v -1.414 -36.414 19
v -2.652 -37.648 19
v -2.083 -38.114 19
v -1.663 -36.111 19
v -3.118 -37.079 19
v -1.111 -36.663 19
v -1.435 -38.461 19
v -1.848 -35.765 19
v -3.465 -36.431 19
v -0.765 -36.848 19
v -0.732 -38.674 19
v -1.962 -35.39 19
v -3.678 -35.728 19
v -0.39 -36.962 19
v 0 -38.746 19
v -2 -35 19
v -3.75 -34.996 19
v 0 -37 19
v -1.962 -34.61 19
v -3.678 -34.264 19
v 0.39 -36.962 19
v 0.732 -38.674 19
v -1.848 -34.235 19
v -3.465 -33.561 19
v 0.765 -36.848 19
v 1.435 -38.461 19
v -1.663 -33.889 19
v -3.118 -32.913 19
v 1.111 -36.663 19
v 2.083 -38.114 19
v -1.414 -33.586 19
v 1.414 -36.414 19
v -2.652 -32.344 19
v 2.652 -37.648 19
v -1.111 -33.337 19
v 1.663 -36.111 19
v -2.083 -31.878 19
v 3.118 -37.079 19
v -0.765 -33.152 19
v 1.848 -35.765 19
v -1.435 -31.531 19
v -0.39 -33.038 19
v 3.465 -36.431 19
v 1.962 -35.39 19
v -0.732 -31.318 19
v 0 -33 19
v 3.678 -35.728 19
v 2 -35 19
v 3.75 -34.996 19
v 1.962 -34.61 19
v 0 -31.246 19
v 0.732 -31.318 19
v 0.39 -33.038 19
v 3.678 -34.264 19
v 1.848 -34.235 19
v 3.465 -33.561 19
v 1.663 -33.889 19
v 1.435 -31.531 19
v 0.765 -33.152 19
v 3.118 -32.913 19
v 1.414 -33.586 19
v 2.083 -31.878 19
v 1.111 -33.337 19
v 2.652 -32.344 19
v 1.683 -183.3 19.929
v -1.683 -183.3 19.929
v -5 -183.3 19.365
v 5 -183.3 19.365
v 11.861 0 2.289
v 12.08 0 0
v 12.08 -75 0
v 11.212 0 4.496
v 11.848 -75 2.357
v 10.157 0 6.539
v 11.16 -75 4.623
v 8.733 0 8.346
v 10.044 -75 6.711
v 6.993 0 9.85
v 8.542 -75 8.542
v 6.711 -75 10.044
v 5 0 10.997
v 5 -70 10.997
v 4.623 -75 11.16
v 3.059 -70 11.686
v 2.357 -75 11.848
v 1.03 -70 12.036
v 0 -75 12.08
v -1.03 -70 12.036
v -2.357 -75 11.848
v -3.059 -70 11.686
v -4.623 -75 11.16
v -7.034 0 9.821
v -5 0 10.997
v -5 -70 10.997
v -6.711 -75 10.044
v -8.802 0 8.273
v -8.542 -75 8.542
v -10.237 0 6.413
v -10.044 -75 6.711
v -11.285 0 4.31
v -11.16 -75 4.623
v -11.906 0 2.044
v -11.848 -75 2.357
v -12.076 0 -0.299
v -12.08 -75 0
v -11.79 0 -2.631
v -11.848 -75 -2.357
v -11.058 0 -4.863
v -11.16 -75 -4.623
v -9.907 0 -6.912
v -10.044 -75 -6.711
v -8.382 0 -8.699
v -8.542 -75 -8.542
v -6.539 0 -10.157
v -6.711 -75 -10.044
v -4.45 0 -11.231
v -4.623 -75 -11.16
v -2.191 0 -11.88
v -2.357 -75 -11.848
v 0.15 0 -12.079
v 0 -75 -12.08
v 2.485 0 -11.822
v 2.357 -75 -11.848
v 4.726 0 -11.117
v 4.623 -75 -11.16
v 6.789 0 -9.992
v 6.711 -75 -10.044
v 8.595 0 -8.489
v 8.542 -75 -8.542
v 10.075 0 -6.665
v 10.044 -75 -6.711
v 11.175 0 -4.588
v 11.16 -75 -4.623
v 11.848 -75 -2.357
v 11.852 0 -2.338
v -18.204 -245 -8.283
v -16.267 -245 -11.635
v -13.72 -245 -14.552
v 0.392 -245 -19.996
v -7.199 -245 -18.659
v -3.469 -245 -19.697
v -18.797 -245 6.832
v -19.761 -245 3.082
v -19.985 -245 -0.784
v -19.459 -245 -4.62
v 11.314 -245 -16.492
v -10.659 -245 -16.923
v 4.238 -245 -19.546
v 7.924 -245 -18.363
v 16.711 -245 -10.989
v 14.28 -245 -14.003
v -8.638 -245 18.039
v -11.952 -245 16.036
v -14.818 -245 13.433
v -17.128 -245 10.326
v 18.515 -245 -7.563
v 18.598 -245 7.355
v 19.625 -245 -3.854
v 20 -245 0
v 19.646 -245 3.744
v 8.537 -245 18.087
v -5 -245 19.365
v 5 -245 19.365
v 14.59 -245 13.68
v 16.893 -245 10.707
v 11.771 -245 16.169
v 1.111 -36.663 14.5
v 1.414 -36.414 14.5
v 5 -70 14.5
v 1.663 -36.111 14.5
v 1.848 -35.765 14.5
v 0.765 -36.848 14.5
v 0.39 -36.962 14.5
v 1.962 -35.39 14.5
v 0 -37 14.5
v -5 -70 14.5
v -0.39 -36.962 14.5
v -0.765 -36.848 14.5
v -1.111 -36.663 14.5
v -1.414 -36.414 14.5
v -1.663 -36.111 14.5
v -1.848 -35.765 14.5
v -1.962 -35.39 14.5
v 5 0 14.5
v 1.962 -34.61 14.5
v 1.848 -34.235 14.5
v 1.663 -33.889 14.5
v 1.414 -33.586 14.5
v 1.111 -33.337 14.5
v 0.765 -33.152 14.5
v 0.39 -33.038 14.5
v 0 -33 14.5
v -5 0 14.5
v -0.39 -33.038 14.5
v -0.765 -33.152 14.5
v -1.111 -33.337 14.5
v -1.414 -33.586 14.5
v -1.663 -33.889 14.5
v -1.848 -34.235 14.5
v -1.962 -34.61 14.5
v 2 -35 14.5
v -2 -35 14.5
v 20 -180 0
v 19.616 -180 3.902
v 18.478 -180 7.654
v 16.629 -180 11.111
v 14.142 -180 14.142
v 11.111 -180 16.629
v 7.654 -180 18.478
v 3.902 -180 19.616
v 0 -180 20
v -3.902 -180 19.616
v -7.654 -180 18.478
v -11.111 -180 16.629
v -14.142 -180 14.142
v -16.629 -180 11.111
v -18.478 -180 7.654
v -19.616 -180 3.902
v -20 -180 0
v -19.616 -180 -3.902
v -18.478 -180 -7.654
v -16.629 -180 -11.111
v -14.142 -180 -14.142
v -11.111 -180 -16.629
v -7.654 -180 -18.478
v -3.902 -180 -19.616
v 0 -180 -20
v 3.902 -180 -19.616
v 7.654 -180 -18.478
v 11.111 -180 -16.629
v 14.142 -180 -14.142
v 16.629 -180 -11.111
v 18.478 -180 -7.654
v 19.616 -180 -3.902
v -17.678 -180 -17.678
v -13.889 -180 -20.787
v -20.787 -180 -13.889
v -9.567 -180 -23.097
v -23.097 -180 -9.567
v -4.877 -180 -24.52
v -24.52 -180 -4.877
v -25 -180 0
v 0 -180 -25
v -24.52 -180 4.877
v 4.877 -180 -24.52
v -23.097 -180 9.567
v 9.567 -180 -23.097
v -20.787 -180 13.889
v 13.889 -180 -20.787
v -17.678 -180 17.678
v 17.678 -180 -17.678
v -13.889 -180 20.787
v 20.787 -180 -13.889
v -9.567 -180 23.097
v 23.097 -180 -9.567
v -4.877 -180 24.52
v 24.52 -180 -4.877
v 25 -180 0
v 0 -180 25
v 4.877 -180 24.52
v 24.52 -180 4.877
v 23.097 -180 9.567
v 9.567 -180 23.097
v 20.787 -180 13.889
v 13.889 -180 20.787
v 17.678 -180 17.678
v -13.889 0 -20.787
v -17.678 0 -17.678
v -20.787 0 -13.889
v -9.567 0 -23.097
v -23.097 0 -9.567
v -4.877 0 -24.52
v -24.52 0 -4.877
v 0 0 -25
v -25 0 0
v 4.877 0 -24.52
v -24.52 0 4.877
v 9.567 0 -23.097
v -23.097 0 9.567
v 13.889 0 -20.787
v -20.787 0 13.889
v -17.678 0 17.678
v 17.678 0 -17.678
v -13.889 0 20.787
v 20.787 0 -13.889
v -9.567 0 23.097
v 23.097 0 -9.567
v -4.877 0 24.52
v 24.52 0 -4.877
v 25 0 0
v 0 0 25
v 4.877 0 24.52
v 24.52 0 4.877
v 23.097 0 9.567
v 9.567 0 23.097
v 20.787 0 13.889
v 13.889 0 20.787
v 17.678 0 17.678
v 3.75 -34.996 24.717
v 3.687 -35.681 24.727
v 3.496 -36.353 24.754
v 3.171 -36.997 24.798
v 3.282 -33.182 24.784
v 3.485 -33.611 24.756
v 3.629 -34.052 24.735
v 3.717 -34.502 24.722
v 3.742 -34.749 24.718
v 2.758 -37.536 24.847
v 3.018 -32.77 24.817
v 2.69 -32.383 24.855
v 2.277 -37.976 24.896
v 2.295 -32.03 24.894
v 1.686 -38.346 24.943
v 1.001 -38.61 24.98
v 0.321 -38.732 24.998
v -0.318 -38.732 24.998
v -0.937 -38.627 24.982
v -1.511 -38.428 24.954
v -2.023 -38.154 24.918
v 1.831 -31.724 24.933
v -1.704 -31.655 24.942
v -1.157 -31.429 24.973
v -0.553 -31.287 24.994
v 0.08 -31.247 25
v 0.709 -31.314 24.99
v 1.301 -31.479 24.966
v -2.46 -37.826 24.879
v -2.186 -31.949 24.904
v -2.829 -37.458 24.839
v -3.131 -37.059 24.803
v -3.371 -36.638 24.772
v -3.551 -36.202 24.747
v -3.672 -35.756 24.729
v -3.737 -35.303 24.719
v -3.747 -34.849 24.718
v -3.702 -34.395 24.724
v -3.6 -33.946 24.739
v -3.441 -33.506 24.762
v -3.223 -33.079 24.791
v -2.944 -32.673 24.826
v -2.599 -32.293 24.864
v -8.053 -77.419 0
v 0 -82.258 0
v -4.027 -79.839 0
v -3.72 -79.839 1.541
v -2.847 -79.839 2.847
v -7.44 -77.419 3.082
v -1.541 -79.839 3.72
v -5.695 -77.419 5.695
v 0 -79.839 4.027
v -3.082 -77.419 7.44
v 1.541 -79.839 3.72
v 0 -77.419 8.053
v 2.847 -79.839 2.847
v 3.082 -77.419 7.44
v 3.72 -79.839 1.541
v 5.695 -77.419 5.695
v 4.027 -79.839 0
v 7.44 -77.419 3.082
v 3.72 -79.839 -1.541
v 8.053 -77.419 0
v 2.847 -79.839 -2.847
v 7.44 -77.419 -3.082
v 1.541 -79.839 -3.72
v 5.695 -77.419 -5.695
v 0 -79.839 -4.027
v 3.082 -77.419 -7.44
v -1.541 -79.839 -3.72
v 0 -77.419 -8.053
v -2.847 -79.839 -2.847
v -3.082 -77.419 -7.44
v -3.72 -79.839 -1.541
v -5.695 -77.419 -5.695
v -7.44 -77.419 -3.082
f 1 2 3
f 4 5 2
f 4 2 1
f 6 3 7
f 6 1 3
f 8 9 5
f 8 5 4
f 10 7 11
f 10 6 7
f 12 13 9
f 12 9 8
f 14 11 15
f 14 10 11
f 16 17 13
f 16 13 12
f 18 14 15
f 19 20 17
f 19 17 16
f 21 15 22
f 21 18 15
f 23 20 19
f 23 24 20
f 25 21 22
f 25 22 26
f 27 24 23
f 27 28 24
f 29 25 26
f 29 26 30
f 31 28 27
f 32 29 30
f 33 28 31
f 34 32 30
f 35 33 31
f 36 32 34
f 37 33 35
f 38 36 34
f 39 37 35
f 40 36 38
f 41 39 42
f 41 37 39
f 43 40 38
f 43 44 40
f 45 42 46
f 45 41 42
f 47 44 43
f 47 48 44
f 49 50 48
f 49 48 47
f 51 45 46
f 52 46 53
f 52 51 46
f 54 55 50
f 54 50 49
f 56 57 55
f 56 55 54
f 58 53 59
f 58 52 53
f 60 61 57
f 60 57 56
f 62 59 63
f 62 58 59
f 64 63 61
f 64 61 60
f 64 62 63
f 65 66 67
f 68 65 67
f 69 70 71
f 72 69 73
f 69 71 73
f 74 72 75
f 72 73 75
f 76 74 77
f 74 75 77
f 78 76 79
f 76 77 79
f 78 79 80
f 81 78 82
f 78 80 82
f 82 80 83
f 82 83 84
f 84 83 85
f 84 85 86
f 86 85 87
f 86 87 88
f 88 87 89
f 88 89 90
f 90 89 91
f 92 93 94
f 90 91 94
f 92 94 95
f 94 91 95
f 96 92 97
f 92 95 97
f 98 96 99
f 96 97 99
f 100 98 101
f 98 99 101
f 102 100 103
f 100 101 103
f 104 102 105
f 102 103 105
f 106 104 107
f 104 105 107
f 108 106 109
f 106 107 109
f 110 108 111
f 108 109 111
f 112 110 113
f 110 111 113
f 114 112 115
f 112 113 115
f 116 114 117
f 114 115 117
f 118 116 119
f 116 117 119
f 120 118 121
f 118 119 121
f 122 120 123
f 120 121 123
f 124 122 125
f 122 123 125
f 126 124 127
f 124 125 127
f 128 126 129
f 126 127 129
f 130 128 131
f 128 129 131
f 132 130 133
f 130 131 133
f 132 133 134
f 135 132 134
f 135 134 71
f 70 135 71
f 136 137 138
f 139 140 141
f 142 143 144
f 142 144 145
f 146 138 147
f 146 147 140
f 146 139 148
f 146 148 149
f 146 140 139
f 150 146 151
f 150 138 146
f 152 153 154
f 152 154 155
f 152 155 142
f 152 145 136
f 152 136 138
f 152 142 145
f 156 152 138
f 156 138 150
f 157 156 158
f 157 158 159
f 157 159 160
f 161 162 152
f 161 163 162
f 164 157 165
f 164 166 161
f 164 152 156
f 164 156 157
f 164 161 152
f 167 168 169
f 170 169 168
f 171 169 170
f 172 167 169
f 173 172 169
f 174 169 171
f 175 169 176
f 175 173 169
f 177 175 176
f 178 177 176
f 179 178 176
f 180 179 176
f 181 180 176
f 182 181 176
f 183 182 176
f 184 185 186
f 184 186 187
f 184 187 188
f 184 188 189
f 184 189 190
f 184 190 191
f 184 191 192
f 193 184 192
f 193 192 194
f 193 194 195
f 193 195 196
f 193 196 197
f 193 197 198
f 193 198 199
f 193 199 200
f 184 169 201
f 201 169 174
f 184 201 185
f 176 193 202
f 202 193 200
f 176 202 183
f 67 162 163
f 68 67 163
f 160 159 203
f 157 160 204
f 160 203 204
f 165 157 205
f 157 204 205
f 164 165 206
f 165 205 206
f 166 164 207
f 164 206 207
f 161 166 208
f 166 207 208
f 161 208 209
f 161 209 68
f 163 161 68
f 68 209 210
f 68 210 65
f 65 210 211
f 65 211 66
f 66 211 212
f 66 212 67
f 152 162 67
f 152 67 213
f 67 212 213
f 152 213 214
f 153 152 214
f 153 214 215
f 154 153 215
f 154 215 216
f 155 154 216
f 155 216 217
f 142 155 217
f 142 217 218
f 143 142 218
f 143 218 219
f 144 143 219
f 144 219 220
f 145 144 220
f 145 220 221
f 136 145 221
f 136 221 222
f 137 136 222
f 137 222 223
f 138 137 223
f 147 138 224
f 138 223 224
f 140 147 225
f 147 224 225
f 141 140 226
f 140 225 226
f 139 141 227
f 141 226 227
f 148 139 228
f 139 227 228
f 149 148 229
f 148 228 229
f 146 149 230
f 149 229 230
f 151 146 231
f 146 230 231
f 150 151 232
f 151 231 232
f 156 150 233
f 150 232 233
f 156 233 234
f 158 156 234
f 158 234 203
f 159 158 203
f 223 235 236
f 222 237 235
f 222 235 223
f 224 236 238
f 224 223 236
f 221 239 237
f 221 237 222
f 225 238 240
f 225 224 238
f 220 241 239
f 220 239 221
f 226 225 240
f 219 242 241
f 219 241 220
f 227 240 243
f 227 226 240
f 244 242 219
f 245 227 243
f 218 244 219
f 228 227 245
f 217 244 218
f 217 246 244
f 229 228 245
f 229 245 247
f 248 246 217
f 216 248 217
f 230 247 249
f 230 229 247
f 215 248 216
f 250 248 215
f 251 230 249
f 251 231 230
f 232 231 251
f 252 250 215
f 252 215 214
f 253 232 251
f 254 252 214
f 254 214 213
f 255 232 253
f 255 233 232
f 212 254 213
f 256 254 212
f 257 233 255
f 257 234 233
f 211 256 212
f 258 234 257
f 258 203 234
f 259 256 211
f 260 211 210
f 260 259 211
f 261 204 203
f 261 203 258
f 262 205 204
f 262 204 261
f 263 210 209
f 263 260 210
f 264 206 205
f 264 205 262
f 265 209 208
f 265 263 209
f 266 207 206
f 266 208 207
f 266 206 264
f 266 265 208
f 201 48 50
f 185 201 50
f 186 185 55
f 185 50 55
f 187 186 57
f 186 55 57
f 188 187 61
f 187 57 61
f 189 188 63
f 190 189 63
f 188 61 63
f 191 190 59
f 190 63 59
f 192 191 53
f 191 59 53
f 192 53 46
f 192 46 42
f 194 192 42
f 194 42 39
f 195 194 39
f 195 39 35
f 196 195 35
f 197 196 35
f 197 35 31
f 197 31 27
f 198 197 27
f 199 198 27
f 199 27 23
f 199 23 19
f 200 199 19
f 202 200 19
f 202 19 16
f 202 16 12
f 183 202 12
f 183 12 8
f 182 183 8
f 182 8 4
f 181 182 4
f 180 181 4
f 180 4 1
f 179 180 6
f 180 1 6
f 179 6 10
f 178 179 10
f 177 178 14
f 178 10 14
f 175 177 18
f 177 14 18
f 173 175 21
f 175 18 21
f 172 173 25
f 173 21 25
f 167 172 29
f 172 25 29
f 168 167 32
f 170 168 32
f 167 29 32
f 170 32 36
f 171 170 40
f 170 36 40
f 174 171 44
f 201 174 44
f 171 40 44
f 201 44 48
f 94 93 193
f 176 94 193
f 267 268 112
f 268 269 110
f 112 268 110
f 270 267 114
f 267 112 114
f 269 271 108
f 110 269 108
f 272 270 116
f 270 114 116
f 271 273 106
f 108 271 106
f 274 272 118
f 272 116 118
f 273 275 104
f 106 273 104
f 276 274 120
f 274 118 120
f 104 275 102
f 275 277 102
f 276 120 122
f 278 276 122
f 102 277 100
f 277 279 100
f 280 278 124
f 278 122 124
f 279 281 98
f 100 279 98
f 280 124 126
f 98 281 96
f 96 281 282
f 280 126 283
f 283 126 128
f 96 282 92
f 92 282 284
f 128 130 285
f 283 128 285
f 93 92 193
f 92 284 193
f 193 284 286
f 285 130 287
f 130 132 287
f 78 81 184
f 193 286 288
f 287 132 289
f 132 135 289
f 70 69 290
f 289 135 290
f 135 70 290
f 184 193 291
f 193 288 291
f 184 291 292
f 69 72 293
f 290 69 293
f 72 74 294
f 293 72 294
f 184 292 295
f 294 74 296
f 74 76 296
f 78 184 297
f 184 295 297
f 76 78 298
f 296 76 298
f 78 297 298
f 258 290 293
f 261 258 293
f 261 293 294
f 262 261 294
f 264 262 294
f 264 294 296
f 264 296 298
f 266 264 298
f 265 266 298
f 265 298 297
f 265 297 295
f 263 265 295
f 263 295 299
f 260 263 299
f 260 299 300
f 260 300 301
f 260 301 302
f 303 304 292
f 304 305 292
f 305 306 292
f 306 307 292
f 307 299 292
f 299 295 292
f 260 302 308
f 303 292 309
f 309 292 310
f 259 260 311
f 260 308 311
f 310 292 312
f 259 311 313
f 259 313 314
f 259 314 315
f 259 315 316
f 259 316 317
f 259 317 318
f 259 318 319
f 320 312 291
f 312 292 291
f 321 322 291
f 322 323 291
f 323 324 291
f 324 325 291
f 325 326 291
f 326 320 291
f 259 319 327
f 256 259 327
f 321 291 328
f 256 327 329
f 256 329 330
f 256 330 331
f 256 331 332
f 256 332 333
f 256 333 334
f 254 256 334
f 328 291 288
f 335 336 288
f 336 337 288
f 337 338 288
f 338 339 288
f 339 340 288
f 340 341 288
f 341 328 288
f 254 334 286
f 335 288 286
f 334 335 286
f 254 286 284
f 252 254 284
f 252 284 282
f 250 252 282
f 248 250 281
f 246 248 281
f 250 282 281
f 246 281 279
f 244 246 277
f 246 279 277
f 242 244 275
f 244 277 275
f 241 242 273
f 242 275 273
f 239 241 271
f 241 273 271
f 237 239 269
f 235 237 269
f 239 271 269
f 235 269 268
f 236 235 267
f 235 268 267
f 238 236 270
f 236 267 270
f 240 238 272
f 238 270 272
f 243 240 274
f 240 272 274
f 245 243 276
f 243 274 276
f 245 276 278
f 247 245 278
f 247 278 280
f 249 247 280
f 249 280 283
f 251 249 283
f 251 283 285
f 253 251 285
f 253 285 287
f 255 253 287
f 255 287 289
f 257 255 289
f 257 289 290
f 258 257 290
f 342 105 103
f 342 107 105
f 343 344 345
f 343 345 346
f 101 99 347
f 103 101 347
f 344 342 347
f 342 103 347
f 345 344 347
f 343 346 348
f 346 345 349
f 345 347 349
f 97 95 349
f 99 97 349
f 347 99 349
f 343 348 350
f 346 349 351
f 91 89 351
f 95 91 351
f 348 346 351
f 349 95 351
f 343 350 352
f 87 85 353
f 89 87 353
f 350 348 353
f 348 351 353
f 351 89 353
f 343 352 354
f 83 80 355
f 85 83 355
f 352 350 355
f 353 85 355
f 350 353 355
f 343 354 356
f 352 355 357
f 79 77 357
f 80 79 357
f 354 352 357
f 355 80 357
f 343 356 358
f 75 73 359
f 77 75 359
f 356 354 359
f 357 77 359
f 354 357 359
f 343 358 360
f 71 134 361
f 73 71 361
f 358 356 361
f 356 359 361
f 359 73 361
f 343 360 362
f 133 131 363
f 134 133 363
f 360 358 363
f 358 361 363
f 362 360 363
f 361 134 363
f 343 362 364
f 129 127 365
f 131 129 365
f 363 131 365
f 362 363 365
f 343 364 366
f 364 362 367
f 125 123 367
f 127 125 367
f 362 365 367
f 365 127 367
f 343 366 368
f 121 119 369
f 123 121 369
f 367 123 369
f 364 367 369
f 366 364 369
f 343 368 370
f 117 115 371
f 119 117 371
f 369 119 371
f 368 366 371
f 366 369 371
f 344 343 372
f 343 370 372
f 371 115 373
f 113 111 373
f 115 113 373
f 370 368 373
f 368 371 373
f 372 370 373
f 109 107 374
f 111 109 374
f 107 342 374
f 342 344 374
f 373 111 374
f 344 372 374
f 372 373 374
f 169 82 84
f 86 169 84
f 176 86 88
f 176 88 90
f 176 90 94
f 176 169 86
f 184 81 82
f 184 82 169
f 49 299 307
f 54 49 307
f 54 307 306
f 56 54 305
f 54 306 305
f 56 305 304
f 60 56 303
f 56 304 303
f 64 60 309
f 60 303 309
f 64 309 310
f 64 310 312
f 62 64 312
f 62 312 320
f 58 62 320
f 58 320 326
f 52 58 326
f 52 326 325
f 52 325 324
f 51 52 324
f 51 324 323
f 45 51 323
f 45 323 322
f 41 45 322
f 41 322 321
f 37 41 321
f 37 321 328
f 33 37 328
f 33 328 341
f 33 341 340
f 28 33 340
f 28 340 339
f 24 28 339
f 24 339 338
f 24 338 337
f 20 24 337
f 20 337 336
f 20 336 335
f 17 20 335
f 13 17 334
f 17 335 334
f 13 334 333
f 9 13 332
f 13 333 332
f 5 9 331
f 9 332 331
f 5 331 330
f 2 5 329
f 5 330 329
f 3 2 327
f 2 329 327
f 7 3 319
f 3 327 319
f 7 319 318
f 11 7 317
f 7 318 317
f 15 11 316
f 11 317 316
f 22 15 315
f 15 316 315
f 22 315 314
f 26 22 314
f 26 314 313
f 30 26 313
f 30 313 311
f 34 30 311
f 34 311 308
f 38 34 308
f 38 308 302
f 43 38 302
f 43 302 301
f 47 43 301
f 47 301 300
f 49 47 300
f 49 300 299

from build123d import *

# Parameters (mm, degrees)
F0_R      = 25
F1_DEPTH  = 180
F2_R      = 20
F3_DEPTH  = 65
F4_W      = 10
F4_H      = 3.1937984634
F5_DEPTH  = 61.7
F7_D      = 24.16
F7_DEPTH  = 75
F7_TIP    = 7.2583962779
F8_W      = 10
F8_H      = 5.6645046324
F9_DEPTH  = 70
F11_R     = 2
F12_DEPTH = 25
F13_R     = 3.75
F14_DEPTH = 6


with BuildPart() as f1:
    # F0 (on Front) → F1 (new body)
    with BuildSketch(Plane.XZ):
        Circle(F0_R)
    extrude(amount=F1_DEPTH)

    # F2 (on face) → F3 (join)
    with BuildSketch(Plane.XZ.offset(180)):
        Circle(F2_R)
    extrude(amount=F3_DEPTH)

    # F4 (on face) → F5 (cut)
    with BuildSketch(Plane.XZ.offset(245)):
        with Locations((0, 20.9618159628)):
            Rectangle(F4_W, F4_H)
    extrude(amount=-F5_DEPTH, mode=Mode.SUBTRACT)

    # F7
    with Locations(Plane(origin=(0, 0, 0), x_dir=(-1, 0, 0), z_dir=(0, 1, 0))):
        with Locations((0, 0)):
            Hole(F7_D / 2, depth=F7_DEPTH)
            with Locations((0, 0, -(F7_DEPTH + F7_TIP / 2))):  # 118° drill point
                Cone(0, F7_D / 2, F7_TIP, mode=Mode.SUBTRACT)

    # F8 (on face) → F9 (cut)
    with BuildSketch(Plane(origin=(0, 0, 0), x_dir=(-1, 0, 0), z_dir=(0, 1, 0))):
        with Locations((0, 11.6677476838)):
            Rectangle(F8_W, F8_H)
    extrude(amount=-F9_DEPTH, mode=Mode.SUBTRACT)

    # F11 (on offset) → F12 (cut)
    with BuildSketch(Plane.XY.offset(25)):
        with Locations((0, -35)):
            Circle(F11_R)
    extrude(amount=-F12_DEPTH, mode=Mode.SUBTRACT)

    # F13 (on offset) → F14 (cut)
    with BuildSketch(Plane.XY.offset(25)):
        with Locations((0, -34.9959954619)):
            Circle(F13_R)
    extrude(amount=-F14_DEPTH, mode=Mode.SUBTRACT)


solid = f1.part
